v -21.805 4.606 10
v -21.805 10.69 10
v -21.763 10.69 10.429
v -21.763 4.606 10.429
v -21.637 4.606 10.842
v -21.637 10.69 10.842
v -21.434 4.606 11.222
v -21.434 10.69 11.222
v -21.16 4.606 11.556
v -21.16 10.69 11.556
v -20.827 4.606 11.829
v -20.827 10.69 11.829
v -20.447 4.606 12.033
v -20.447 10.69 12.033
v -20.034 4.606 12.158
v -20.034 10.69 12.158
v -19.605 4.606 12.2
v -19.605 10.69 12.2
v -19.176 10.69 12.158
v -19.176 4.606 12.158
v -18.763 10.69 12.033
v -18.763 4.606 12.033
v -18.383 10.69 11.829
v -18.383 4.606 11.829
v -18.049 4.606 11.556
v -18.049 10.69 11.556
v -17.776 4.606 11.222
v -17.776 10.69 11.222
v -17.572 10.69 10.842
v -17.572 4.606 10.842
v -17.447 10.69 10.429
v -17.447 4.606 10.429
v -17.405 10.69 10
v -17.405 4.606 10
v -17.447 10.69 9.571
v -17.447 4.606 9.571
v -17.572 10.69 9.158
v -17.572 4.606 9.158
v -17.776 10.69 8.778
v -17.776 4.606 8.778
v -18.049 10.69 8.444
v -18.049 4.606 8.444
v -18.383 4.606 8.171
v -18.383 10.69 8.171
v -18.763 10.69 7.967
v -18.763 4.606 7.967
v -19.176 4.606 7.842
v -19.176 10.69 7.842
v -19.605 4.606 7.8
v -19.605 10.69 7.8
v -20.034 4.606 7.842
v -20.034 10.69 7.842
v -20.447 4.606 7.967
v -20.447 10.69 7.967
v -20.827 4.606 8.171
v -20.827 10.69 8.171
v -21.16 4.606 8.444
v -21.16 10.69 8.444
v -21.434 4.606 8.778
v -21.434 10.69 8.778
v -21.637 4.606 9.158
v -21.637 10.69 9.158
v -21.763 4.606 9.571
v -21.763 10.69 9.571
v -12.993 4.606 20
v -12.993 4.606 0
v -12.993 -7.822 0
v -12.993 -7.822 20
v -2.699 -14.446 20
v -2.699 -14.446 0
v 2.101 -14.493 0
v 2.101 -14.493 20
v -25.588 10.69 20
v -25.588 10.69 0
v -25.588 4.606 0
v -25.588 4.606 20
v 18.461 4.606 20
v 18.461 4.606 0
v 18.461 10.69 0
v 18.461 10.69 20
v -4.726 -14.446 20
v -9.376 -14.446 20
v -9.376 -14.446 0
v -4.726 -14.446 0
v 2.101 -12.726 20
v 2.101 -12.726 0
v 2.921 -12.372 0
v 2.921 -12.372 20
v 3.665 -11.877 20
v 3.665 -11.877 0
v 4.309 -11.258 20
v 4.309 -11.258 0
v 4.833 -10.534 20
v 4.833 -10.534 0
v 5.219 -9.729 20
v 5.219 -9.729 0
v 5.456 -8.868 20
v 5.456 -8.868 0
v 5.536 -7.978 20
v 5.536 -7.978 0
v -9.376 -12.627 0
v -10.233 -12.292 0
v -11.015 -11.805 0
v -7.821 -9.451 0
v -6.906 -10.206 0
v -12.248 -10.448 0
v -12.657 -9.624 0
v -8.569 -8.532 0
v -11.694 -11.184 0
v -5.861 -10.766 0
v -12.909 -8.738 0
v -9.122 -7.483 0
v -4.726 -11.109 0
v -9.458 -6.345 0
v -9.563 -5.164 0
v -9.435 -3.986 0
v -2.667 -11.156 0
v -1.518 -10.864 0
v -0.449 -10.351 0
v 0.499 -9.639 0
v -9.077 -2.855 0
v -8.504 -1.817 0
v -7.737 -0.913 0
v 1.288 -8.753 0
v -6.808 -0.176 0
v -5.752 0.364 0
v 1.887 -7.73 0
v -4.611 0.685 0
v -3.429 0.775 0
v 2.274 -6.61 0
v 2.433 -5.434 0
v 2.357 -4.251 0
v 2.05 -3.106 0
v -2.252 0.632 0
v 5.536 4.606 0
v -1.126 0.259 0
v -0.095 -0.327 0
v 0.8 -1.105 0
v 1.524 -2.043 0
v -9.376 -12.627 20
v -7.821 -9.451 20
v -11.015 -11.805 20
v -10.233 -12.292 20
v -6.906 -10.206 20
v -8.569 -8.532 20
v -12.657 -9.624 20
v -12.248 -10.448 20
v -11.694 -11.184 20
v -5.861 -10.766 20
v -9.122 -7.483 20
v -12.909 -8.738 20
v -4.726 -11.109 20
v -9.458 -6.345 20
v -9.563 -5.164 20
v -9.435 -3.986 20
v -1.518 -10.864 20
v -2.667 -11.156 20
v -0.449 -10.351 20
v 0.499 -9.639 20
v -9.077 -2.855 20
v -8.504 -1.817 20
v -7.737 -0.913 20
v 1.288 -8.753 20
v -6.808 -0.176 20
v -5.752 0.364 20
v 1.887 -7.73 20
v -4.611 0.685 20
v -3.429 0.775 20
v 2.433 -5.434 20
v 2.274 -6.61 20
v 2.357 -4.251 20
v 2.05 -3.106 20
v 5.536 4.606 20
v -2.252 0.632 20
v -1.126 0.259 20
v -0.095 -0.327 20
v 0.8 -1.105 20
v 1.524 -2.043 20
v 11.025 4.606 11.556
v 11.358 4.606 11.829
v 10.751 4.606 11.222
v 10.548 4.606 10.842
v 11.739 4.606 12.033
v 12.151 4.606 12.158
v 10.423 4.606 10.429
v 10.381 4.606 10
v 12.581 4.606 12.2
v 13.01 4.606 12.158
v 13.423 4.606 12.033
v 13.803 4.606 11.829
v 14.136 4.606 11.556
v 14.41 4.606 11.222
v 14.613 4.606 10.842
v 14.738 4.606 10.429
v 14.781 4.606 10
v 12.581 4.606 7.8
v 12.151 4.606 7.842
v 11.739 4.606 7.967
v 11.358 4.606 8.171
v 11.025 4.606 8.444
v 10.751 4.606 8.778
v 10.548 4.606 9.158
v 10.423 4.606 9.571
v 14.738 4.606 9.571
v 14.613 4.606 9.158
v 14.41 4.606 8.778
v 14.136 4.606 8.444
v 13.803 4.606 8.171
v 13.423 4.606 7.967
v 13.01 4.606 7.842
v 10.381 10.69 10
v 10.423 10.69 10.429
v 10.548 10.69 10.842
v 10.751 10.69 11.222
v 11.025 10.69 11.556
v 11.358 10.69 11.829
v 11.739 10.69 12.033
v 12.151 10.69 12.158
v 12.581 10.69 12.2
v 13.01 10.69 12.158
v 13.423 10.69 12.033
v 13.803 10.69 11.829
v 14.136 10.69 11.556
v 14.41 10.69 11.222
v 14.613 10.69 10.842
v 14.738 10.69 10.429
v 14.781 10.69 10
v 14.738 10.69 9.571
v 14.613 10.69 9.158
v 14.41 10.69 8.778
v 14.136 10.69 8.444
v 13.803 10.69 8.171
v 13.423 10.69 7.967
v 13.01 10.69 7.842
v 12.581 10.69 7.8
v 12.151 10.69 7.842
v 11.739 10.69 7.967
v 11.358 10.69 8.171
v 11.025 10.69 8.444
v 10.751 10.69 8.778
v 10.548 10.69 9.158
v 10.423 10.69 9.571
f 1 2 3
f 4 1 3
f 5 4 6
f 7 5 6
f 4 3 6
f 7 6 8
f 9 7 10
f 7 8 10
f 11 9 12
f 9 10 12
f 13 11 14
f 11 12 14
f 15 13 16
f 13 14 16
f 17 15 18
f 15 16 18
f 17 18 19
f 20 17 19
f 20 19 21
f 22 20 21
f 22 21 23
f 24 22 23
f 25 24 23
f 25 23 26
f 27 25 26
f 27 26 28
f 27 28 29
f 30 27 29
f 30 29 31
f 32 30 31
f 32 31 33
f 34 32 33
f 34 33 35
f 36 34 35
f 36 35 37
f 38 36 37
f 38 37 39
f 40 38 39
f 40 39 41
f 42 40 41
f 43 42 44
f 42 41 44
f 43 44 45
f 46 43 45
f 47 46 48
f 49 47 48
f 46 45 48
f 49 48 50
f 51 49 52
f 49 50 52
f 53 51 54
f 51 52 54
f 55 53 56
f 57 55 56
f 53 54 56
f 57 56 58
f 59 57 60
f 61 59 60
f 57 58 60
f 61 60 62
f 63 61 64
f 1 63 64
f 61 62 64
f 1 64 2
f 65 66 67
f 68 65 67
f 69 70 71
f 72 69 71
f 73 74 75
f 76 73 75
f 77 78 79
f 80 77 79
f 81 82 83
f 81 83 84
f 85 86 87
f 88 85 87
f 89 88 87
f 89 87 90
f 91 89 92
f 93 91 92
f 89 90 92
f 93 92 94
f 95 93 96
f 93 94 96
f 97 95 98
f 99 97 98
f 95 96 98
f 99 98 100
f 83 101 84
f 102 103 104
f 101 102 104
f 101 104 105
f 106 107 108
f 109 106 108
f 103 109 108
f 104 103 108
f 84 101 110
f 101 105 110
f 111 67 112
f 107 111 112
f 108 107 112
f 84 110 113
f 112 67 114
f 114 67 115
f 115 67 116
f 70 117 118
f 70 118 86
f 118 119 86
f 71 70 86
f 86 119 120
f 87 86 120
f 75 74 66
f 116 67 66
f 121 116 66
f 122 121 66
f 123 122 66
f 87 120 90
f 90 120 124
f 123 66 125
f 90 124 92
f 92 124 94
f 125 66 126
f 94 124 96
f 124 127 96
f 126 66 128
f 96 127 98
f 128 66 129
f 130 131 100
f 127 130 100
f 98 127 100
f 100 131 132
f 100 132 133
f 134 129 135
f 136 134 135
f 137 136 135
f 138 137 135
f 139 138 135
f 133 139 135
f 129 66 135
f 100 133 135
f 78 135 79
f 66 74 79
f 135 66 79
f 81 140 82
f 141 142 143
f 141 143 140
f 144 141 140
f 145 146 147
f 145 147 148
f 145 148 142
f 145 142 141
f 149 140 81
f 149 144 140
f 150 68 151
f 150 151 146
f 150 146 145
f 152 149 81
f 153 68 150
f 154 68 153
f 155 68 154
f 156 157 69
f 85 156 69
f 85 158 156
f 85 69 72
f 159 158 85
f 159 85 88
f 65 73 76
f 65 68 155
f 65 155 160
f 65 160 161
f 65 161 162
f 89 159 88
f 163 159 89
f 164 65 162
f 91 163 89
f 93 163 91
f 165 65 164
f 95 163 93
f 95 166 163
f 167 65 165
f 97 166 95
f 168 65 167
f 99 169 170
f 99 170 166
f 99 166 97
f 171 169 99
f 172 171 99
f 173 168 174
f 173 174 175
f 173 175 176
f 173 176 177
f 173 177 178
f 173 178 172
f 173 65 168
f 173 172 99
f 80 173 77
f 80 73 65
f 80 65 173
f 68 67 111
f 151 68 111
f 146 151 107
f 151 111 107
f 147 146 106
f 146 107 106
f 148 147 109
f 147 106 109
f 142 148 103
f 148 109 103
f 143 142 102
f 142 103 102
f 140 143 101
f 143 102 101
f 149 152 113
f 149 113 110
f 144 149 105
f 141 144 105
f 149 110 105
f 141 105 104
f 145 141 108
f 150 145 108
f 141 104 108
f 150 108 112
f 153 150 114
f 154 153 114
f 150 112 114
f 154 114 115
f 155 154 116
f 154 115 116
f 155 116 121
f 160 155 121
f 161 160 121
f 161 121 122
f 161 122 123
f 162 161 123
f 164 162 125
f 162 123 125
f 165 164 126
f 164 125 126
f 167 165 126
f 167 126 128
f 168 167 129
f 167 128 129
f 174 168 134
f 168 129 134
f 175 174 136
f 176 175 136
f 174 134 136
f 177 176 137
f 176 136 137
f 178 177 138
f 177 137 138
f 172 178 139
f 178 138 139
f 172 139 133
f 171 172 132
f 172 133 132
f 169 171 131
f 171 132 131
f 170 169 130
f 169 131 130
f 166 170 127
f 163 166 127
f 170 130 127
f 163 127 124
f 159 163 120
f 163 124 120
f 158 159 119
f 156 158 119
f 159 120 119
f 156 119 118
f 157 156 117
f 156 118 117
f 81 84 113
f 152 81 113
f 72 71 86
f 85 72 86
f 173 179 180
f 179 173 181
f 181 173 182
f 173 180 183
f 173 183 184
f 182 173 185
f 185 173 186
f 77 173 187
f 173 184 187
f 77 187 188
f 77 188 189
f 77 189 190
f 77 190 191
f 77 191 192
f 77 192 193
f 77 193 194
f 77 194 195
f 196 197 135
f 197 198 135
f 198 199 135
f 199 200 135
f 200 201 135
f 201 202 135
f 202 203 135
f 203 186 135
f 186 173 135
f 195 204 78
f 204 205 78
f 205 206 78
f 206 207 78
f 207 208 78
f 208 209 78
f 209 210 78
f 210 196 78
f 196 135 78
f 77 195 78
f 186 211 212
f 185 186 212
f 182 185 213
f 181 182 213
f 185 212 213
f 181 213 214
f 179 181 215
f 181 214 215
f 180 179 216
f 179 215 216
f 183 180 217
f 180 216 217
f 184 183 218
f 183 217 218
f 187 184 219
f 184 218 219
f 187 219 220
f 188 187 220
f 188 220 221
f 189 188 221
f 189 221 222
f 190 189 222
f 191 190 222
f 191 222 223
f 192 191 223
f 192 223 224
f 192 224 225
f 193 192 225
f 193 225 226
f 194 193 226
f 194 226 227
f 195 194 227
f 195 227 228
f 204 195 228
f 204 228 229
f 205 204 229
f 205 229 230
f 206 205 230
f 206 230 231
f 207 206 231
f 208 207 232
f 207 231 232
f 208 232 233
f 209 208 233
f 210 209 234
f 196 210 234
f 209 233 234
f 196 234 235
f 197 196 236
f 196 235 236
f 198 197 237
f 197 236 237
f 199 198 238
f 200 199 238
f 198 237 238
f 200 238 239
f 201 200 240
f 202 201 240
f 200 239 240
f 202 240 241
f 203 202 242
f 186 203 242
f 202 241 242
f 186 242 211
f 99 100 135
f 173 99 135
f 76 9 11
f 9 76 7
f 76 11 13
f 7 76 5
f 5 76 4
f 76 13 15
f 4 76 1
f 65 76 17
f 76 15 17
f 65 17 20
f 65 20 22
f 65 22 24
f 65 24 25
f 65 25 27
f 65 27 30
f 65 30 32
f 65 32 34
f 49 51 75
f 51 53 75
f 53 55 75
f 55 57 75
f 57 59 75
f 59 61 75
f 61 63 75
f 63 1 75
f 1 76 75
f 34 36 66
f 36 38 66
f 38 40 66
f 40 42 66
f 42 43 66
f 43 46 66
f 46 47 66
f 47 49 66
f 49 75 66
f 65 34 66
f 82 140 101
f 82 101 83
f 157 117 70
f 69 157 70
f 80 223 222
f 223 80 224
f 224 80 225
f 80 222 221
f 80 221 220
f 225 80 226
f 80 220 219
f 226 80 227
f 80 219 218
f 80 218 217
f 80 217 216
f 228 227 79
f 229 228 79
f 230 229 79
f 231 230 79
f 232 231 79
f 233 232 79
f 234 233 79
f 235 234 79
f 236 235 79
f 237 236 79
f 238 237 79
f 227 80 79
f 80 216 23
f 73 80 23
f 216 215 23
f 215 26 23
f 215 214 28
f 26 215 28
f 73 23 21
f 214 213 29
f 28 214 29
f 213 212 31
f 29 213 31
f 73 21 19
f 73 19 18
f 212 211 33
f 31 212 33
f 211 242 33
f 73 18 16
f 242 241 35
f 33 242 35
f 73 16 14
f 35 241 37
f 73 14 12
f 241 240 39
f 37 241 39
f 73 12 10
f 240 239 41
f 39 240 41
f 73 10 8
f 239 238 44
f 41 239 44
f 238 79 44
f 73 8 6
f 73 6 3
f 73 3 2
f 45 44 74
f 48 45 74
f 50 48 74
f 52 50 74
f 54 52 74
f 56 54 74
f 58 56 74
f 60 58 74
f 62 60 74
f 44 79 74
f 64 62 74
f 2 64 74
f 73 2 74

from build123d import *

# Parameters (mm, degrees)
F1_DEPTH = 20
F2_R     = 2.2
F3_DEPTH = 25


with BuildPart() as f1:
    # F0 (on Top) → F1 (new body)
    with BuildSketch(Plane.XY):
        with BuildLine():
            Line((18.46081, 10.690042), (-25.588245, 10.690042))
            Line((-25.588245, 10.690042), (-25.588245, 4.606251))
            Line((-25.588245, 4.606251), (-12.993412, 4.606251))
            Line((-12.993412, 4.606251), (-12.993412, -7.821557))
            ThreePointArc((-12.993412, -7.821557), (-11.987899, -10.828894), (-9.375783, -12.626664))
            Line((-9.375783, -12.626664), (-9.375783, -14.446242))
            Line((-9.375783, -14.446242), (-4.726099, -14.446242))
            Line((-4.726099, -14.446242), (-4.726099, -11.10937))
            ThreePointArc((-4.726099, -11.10937), (-3.428711, 0.77544), (-2.667342, -11.155706))
            Line((-2.667342, -11.155706), (-2.69909, -14.446242))
            Line((-2.69909, -14.446242), (2.101209, -14.492556))
            Line((2.101209, -14.492556), (2.101209, -12.726463))
            ThreePointArc((2.101209, -12.726463), (4.587048, -10.908086), (5.535637, -7.977886))
            Line((5.535637, -7.977886), (5.535637, 4.606251))
            Line((5.535637, 4.606251), (18.46081, 4.606251))
            Line((18.46081, 4.606251), (18.46081, 10.690042))
        make_face()
    extrude(amount=F1_DEPTH)

    # F2 (on face) → F3 (cut)
    with BuildSketch(Plane(origin=(0, 10.690042, 0), x_dir=(-1, 0, 0), z_dir=(0, 1, 0))):
        with Locations((-12.580651, 10)):
            Circle(F2_R)
        with Locations((19.604826, 10)):
            Circle(F2_R)
    extrude(amount=-F3_DEPTH, mode=Mode.SUBTRACT)


solid = f1.part
